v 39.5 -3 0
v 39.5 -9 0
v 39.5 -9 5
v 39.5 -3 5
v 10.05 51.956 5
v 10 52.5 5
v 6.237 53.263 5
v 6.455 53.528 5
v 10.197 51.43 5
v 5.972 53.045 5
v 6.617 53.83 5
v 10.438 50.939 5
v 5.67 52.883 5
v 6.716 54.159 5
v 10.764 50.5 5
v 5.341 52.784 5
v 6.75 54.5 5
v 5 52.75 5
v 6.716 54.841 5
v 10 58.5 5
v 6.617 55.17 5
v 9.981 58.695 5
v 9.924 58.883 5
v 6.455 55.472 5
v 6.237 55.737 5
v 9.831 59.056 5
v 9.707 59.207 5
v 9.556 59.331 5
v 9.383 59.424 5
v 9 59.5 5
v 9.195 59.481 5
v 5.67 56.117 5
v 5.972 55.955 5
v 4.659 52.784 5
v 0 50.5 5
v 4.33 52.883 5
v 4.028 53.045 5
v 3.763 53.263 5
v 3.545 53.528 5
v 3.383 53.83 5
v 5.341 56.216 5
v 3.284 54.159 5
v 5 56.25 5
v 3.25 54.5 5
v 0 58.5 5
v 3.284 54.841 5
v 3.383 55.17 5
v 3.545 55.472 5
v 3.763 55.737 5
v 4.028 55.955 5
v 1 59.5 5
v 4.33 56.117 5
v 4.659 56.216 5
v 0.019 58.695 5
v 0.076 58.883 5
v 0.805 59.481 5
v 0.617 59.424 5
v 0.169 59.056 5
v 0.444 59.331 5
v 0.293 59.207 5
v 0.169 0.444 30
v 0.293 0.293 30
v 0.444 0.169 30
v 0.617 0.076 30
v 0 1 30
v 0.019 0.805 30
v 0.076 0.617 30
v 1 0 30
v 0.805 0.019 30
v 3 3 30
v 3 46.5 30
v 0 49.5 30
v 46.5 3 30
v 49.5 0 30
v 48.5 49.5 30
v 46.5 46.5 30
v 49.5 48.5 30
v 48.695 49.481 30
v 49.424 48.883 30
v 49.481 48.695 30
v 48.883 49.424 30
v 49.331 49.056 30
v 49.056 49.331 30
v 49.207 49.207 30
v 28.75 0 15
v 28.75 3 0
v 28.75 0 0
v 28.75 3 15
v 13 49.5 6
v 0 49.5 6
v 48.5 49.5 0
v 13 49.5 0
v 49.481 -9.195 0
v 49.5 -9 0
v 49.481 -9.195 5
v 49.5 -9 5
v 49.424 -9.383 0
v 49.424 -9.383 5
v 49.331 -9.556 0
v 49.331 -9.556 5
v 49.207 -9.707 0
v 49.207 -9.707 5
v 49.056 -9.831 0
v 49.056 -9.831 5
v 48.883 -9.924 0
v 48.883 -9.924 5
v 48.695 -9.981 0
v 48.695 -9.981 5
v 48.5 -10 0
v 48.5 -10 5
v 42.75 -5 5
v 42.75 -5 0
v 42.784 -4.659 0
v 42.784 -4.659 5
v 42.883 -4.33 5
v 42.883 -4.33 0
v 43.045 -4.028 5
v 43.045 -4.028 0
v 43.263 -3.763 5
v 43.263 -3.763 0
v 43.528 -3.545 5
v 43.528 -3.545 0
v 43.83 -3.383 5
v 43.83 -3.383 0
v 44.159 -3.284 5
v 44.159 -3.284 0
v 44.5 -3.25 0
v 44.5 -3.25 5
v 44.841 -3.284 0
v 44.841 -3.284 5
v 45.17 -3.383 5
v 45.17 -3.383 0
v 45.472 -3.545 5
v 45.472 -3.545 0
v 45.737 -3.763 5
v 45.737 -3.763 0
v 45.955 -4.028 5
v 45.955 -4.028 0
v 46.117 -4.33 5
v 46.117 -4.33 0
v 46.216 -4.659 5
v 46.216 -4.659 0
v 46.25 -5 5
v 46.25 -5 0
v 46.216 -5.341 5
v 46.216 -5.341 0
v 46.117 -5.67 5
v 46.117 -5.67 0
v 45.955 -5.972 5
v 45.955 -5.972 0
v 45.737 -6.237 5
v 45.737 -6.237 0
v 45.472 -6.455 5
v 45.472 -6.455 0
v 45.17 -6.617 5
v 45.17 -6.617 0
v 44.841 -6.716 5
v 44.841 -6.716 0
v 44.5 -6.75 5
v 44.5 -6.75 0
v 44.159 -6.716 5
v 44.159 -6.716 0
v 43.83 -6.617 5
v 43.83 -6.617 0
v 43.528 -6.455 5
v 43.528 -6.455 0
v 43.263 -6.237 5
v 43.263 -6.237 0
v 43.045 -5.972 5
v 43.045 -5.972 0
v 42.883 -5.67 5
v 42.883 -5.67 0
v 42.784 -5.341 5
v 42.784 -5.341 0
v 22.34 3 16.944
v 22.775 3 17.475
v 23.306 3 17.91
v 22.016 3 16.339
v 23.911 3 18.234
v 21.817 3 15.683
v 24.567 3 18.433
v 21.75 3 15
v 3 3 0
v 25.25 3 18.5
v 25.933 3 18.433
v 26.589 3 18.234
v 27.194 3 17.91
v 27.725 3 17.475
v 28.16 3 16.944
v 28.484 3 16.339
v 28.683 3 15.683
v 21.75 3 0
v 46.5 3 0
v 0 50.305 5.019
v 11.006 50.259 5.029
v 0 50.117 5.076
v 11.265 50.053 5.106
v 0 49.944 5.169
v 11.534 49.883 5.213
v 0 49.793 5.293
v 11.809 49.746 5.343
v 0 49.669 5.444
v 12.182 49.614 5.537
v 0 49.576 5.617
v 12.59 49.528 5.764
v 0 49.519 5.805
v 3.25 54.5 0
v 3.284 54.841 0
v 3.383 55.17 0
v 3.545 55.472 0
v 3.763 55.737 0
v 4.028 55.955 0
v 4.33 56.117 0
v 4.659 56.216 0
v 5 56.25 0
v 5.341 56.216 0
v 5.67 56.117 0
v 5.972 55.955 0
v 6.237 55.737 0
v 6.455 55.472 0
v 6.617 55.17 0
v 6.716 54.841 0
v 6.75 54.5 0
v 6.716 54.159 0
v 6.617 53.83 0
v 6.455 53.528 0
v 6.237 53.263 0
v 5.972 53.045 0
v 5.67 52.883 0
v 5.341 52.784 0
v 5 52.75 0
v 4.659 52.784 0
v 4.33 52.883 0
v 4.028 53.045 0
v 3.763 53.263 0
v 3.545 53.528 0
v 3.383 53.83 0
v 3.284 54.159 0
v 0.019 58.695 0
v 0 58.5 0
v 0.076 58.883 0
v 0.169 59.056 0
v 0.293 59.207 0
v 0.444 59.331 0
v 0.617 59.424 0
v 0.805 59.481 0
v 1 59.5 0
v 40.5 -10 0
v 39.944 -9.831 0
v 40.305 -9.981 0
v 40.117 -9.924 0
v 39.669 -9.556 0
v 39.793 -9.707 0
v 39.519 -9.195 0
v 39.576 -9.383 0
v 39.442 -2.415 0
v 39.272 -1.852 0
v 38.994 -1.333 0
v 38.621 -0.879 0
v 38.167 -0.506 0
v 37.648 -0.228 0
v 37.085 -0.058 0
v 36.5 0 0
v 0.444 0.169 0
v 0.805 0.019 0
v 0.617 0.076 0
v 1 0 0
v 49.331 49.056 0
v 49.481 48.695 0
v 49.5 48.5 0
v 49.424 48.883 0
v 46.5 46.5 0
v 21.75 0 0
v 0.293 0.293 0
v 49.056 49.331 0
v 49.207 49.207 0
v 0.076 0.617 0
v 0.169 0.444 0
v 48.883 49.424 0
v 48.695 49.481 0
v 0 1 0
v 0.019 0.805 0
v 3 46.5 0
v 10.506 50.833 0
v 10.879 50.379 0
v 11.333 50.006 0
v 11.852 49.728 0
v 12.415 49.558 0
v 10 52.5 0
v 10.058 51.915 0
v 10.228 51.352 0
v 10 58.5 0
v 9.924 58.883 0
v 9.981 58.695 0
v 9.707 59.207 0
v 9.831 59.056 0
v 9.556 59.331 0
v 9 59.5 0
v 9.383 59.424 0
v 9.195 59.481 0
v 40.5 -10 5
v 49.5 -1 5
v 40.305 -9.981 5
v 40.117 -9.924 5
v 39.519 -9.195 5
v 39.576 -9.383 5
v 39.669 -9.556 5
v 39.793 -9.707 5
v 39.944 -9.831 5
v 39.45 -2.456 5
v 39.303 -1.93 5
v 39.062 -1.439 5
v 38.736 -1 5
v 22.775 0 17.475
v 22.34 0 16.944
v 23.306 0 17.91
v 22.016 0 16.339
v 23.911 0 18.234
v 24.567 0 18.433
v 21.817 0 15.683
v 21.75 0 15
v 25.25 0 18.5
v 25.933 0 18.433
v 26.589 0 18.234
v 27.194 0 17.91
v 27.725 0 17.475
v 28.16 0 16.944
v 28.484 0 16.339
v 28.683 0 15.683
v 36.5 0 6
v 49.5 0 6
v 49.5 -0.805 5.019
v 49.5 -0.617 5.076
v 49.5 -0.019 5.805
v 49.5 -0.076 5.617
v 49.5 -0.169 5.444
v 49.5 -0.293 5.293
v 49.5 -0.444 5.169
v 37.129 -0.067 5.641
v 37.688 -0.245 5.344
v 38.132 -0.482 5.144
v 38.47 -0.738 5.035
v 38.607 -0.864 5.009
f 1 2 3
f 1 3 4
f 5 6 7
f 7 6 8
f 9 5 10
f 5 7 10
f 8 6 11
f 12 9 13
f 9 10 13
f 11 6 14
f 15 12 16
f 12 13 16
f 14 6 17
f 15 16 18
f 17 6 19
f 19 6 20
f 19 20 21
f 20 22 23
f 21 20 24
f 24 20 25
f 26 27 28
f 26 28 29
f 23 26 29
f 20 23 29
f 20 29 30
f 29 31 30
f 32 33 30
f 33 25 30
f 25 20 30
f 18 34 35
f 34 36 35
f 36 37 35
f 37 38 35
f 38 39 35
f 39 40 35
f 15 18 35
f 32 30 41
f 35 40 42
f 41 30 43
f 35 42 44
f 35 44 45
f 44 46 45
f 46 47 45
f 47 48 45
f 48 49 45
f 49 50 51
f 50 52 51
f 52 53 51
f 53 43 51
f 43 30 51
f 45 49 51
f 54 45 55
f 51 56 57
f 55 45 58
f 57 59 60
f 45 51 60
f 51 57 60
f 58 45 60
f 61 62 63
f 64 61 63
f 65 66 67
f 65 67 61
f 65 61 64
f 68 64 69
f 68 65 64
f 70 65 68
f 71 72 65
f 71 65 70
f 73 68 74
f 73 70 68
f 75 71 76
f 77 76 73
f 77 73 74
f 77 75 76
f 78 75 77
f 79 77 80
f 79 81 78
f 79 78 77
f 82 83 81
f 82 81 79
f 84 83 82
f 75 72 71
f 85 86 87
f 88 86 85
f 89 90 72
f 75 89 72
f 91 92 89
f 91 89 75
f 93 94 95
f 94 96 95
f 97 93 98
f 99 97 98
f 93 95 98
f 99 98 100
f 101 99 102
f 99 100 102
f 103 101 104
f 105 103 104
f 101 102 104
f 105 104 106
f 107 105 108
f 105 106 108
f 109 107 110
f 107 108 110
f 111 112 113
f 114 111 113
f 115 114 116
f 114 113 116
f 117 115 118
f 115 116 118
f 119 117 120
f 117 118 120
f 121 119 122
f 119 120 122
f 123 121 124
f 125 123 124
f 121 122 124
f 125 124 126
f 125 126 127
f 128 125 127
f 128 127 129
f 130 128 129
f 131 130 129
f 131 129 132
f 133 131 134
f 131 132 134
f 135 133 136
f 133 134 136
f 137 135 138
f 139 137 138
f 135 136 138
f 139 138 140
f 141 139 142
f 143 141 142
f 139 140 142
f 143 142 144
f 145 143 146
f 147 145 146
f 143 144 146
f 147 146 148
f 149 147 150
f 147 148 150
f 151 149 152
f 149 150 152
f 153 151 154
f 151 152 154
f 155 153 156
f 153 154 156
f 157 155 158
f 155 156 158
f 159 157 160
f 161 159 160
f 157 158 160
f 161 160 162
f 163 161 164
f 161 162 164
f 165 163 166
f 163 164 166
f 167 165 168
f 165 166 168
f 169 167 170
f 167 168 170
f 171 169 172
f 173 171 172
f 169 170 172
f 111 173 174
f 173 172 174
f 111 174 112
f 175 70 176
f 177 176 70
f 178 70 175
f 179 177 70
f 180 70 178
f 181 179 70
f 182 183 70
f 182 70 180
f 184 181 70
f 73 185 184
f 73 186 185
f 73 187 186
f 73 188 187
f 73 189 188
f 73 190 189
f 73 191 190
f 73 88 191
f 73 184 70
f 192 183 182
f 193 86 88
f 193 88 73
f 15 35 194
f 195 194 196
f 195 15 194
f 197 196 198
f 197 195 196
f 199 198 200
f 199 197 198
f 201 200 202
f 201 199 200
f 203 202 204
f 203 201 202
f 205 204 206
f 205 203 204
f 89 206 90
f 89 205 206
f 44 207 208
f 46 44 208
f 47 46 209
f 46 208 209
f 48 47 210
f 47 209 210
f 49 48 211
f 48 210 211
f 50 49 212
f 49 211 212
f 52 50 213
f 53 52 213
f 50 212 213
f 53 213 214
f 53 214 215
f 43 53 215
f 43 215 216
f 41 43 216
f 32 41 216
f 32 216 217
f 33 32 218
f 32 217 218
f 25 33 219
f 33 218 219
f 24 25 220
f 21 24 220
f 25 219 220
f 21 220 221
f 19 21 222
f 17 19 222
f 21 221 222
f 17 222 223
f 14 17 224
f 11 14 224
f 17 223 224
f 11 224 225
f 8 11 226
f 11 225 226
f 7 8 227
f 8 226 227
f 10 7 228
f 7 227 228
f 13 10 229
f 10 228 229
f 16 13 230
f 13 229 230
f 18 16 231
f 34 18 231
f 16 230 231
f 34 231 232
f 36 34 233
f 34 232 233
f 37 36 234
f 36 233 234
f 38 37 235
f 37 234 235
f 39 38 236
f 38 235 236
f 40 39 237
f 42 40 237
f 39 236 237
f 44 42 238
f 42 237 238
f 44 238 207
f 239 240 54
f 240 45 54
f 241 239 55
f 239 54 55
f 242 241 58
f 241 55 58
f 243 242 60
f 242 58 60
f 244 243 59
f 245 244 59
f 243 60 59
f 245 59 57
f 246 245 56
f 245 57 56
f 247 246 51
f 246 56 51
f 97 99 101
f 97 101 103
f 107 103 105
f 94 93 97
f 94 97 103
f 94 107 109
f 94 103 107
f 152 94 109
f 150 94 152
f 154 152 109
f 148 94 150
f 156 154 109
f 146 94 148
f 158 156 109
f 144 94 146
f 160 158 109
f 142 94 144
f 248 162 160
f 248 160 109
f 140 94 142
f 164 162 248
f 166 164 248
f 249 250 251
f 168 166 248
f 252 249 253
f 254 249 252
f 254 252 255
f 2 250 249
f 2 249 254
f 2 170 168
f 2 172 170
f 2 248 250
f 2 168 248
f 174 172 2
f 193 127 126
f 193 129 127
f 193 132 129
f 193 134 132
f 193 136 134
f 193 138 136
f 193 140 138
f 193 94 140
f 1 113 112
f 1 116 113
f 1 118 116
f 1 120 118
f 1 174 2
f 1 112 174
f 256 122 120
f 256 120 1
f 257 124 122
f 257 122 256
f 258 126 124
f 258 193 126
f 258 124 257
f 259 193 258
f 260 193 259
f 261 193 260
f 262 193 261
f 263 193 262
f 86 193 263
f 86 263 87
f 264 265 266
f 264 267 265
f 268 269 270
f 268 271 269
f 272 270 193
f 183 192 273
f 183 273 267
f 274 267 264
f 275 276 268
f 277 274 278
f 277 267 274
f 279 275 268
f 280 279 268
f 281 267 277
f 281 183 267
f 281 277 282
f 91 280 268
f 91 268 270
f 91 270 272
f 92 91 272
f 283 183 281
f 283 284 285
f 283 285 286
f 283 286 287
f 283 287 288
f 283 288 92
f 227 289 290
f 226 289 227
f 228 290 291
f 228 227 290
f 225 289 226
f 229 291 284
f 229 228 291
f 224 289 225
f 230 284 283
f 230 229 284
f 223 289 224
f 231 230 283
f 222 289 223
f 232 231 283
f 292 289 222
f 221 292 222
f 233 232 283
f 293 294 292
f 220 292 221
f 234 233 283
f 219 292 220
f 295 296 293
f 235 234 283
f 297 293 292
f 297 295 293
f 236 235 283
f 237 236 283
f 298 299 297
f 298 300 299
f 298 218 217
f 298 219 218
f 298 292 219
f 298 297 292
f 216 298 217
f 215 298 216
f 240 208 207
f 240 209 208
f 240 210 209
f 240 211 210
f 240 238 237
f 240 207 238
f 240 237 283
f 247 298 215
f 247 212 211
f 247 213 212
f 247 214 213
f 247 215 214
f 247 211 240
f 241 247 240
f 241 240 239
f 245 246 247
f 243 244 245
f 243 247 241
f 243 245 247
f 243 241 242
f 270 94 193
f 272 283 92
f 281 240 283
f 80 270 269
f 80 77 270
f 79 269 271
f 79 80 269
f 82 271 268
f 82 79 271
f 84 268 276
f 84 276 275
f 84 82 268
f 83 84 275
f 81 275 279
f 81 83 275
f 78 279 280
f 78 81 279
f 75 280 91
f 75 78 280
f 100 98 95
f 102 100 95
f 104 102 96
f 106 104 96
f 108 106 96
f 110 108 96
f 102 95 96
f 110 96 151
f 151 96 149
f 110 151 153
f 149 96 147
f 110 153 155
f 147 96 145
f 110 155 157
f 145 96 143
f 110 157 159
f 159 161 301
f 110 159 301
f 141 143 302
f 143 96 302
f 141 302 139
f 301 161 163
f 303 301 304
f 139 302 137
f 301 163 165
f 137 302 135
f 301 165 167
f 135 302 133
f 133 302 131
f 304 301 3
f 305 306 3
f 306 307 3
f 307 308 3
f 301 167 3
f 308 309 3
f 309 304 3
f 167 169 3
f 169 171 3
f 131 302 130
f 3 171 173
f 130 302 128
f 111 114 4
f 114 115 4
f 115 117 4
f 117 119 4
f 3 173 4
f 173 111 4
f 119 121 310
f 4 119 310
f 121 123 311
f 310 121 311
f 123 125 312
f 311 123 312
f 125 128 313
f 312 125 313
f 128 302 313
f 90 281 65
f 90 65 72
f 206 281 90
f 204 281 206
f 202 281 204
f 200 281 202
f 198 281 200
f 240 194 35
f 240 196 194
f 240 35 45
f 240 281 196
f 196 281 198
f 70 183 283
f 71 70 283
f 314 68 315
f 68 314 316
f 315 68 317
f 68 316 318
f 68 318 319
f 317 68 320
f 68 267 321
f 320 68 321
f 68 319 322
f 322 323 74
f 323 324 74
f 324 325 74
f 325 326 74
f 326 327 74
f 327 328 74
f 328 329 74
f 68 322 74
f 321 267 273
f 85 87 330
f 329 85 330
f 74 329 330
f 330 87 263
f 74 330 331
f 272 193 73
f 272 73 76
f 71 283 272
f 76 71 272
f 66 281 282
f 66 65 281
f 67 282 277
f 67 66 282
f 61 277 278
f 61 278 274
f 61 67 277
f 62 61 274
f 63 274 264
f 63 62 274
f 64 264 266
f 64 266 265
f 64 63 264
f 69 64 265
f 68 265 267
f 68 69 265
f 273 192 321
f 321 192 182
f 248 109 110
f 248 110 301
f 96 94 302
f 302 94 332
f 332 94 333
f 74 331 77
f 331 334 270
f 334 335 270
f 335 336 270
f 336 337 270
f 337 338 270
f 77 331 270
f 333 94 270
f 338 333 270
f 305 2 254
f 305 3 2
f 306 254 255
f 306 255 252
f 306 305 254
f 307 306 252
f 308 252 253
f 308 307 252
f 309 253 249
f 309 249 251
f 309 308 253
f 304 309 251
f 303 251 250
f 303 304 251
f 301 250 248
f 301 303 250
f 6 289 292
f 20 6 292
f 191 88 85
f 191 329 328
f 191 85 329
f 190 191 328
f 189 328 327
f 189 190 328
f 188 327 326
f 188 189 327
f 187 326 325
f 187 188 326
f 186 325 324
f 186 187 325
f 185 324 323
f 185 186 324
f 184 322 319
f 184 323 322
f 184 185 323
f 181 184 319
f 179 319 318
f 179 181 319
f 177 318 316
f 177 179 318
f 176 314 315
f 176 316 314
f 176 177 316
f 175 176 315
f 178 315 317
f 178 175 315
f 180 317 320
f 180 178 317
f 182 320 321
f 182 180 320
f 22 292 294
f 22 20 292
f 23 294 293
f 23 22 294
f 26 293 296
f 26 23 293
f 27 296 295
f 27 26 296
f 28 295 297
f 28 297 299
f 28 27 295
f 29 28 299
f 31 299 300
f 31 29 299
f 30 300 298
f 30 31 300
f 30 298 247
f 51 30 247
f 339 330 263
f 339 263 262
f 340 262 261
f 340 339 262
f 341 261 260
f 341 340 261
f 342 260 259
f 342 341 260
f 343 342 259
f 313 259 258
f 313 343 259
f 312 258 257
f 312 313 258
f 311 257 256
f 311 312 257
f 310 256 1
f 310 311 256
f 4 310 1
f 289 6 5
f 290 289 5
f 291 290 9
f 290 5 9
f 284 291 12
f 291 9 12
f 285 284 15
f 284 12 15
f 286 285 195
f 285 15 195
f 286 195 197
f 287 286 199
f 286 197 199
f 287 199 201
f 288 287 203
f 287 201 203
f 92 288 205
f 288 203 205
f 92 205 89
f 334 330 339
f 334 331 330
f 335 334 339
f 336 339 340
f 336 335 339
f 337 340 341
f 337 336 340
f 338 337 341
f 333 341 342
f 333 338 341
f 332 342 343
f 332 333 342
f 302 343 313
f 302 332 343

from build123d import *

# Parameters (mm, degrees)
ESQUISSE1_W             = 49.5
ESQUISSE1_H             = 49.5
ESQUISSE1_W_2           = 43.5
ESQUISSE1_H_2           = 43.5
BOSS_EXTRU_1_DEPTH      = 30
ESQUISSE2_W             = 10
ESQUISSE2_H             = 10
ESQUISSE2_R             = 1.75
BOSS_EXTRU_2_DEPTH      = 5
CONG_1_R                = 1
CONG_2_R                = 3
CONG_3_R                = 1
CUT_EXTRUDE1_DEPTH      = 24
CUT_EXTRUDE1_DEPTH_BACK = 21.171554026
SKETCH1_W               = 3.5
SKETCH1_H               = 15


with BuildPart() as part:
    # Esquisse1 → Boss.-Extru.1 (new body)
    with BuildSketch(Plane.XY):
        with Locations((24.75, 24.75)):
            Rectangle(ESQUISSE1_W, ESQUISSE1_H)
        with Locations((24.75, 24.75)):
            Rectangle(ESQUISSE1_W_2, ESQUISSE1_H_2, mode=Mode.SUBTRACT)
    extrude(amount=BOSS_EXTRU_1_DEPTH)

    # Esquisse2 → Boss.-Extru.2 (add)
    # profile 1 of 2: a face of its own
    with BuildSketch(Plane(origin=(0, 0, 0), x_dir=(-1, 0, 0), z_dir=(0, 0, -1))):
        with Locations((-5, 54.5)):
            Rectangle(ESQUISSE2_W, ESQUISSE2_H)
        with Locations((-5, 54.5)):
            Circle(ESQUISSE2_R, mode=Mode.SUBTRACT)
    # profile 2 of 2: a face of its own
    with BuildSketch(Plane(origin=(0, 0, 0), x_dir=(-1, 0, 0), z_dir=(0, 0, -1))):
        with Locations((-44.5, -5)):
            Rectangle(ESQUISSE2_W, ESQUISSE2_H)
        with Locations((-44.5, -5)):
            Circle(ESQUISSE2_R, mode=Mode.SUBTRACT)
    extrude(amount=-BOSS_EXTRU_2_DEPTH)

    # Congé1
    cong_1_edges = [part.edges().sort_by_distance(p)[0] for p in [
        (0, 59.5, 2.5),
        (10, 59.5, 2.5),
        (49.5, -10, 2.5),
        (39.5, -10, 2.5),
        (49.5, 49.5, 15),
        (0, 0, 15),
    ]]
    fillet(cong_1_edges, radius=CONG_1_R)

    # Congé2
    cong_2_edges = [part.edges().sort_by_distance(p)[0] for p in [
        (10, 49.5, 2.5),
        (39.5, 0, 2.5),
    ]]
    fillet(cong_2_edges, radius=CONG_2_R)

    # Congé3
    cong_3_edges = [part.edges().sort_by_distance(p)[0] for p in [
        (6.5, 49.5, 5),
        (43, 0, 5),
    ]]
    fillet(cong_3_edges, radius=CONG_3_R)

    # Sketch1 → Cut-Extrude1 (cut, two sides: drawn at the far end of the back side and taken through both)
    with BuildSketch(Plane.XZ.offset(-CUT_EXTRUDE1_DEPTH_BACK)):
        with BuildLine():
            ThreePointArc((28.75, 15), (25.25, 18.5), (21.75, 15))
            Line((21.75, 15), (25.25, 15))
            Line((25.25, 15), (28.75, 15))
        make_face()
        with Locations((27, 7.5)):
            Rectangle(SKETCH1_W, SKETCH1_H)
        with Locations((23.5, 7.5)):
            Rectangle(SKETCH1_W, SKETCH1_H)
    extrude(amount=CUT_EXTRUDE1_DEPTH + CUT_EXTRUDE1_DEPTH_BACK, mode=Mode.SUBTRACT)


solid = part.part
